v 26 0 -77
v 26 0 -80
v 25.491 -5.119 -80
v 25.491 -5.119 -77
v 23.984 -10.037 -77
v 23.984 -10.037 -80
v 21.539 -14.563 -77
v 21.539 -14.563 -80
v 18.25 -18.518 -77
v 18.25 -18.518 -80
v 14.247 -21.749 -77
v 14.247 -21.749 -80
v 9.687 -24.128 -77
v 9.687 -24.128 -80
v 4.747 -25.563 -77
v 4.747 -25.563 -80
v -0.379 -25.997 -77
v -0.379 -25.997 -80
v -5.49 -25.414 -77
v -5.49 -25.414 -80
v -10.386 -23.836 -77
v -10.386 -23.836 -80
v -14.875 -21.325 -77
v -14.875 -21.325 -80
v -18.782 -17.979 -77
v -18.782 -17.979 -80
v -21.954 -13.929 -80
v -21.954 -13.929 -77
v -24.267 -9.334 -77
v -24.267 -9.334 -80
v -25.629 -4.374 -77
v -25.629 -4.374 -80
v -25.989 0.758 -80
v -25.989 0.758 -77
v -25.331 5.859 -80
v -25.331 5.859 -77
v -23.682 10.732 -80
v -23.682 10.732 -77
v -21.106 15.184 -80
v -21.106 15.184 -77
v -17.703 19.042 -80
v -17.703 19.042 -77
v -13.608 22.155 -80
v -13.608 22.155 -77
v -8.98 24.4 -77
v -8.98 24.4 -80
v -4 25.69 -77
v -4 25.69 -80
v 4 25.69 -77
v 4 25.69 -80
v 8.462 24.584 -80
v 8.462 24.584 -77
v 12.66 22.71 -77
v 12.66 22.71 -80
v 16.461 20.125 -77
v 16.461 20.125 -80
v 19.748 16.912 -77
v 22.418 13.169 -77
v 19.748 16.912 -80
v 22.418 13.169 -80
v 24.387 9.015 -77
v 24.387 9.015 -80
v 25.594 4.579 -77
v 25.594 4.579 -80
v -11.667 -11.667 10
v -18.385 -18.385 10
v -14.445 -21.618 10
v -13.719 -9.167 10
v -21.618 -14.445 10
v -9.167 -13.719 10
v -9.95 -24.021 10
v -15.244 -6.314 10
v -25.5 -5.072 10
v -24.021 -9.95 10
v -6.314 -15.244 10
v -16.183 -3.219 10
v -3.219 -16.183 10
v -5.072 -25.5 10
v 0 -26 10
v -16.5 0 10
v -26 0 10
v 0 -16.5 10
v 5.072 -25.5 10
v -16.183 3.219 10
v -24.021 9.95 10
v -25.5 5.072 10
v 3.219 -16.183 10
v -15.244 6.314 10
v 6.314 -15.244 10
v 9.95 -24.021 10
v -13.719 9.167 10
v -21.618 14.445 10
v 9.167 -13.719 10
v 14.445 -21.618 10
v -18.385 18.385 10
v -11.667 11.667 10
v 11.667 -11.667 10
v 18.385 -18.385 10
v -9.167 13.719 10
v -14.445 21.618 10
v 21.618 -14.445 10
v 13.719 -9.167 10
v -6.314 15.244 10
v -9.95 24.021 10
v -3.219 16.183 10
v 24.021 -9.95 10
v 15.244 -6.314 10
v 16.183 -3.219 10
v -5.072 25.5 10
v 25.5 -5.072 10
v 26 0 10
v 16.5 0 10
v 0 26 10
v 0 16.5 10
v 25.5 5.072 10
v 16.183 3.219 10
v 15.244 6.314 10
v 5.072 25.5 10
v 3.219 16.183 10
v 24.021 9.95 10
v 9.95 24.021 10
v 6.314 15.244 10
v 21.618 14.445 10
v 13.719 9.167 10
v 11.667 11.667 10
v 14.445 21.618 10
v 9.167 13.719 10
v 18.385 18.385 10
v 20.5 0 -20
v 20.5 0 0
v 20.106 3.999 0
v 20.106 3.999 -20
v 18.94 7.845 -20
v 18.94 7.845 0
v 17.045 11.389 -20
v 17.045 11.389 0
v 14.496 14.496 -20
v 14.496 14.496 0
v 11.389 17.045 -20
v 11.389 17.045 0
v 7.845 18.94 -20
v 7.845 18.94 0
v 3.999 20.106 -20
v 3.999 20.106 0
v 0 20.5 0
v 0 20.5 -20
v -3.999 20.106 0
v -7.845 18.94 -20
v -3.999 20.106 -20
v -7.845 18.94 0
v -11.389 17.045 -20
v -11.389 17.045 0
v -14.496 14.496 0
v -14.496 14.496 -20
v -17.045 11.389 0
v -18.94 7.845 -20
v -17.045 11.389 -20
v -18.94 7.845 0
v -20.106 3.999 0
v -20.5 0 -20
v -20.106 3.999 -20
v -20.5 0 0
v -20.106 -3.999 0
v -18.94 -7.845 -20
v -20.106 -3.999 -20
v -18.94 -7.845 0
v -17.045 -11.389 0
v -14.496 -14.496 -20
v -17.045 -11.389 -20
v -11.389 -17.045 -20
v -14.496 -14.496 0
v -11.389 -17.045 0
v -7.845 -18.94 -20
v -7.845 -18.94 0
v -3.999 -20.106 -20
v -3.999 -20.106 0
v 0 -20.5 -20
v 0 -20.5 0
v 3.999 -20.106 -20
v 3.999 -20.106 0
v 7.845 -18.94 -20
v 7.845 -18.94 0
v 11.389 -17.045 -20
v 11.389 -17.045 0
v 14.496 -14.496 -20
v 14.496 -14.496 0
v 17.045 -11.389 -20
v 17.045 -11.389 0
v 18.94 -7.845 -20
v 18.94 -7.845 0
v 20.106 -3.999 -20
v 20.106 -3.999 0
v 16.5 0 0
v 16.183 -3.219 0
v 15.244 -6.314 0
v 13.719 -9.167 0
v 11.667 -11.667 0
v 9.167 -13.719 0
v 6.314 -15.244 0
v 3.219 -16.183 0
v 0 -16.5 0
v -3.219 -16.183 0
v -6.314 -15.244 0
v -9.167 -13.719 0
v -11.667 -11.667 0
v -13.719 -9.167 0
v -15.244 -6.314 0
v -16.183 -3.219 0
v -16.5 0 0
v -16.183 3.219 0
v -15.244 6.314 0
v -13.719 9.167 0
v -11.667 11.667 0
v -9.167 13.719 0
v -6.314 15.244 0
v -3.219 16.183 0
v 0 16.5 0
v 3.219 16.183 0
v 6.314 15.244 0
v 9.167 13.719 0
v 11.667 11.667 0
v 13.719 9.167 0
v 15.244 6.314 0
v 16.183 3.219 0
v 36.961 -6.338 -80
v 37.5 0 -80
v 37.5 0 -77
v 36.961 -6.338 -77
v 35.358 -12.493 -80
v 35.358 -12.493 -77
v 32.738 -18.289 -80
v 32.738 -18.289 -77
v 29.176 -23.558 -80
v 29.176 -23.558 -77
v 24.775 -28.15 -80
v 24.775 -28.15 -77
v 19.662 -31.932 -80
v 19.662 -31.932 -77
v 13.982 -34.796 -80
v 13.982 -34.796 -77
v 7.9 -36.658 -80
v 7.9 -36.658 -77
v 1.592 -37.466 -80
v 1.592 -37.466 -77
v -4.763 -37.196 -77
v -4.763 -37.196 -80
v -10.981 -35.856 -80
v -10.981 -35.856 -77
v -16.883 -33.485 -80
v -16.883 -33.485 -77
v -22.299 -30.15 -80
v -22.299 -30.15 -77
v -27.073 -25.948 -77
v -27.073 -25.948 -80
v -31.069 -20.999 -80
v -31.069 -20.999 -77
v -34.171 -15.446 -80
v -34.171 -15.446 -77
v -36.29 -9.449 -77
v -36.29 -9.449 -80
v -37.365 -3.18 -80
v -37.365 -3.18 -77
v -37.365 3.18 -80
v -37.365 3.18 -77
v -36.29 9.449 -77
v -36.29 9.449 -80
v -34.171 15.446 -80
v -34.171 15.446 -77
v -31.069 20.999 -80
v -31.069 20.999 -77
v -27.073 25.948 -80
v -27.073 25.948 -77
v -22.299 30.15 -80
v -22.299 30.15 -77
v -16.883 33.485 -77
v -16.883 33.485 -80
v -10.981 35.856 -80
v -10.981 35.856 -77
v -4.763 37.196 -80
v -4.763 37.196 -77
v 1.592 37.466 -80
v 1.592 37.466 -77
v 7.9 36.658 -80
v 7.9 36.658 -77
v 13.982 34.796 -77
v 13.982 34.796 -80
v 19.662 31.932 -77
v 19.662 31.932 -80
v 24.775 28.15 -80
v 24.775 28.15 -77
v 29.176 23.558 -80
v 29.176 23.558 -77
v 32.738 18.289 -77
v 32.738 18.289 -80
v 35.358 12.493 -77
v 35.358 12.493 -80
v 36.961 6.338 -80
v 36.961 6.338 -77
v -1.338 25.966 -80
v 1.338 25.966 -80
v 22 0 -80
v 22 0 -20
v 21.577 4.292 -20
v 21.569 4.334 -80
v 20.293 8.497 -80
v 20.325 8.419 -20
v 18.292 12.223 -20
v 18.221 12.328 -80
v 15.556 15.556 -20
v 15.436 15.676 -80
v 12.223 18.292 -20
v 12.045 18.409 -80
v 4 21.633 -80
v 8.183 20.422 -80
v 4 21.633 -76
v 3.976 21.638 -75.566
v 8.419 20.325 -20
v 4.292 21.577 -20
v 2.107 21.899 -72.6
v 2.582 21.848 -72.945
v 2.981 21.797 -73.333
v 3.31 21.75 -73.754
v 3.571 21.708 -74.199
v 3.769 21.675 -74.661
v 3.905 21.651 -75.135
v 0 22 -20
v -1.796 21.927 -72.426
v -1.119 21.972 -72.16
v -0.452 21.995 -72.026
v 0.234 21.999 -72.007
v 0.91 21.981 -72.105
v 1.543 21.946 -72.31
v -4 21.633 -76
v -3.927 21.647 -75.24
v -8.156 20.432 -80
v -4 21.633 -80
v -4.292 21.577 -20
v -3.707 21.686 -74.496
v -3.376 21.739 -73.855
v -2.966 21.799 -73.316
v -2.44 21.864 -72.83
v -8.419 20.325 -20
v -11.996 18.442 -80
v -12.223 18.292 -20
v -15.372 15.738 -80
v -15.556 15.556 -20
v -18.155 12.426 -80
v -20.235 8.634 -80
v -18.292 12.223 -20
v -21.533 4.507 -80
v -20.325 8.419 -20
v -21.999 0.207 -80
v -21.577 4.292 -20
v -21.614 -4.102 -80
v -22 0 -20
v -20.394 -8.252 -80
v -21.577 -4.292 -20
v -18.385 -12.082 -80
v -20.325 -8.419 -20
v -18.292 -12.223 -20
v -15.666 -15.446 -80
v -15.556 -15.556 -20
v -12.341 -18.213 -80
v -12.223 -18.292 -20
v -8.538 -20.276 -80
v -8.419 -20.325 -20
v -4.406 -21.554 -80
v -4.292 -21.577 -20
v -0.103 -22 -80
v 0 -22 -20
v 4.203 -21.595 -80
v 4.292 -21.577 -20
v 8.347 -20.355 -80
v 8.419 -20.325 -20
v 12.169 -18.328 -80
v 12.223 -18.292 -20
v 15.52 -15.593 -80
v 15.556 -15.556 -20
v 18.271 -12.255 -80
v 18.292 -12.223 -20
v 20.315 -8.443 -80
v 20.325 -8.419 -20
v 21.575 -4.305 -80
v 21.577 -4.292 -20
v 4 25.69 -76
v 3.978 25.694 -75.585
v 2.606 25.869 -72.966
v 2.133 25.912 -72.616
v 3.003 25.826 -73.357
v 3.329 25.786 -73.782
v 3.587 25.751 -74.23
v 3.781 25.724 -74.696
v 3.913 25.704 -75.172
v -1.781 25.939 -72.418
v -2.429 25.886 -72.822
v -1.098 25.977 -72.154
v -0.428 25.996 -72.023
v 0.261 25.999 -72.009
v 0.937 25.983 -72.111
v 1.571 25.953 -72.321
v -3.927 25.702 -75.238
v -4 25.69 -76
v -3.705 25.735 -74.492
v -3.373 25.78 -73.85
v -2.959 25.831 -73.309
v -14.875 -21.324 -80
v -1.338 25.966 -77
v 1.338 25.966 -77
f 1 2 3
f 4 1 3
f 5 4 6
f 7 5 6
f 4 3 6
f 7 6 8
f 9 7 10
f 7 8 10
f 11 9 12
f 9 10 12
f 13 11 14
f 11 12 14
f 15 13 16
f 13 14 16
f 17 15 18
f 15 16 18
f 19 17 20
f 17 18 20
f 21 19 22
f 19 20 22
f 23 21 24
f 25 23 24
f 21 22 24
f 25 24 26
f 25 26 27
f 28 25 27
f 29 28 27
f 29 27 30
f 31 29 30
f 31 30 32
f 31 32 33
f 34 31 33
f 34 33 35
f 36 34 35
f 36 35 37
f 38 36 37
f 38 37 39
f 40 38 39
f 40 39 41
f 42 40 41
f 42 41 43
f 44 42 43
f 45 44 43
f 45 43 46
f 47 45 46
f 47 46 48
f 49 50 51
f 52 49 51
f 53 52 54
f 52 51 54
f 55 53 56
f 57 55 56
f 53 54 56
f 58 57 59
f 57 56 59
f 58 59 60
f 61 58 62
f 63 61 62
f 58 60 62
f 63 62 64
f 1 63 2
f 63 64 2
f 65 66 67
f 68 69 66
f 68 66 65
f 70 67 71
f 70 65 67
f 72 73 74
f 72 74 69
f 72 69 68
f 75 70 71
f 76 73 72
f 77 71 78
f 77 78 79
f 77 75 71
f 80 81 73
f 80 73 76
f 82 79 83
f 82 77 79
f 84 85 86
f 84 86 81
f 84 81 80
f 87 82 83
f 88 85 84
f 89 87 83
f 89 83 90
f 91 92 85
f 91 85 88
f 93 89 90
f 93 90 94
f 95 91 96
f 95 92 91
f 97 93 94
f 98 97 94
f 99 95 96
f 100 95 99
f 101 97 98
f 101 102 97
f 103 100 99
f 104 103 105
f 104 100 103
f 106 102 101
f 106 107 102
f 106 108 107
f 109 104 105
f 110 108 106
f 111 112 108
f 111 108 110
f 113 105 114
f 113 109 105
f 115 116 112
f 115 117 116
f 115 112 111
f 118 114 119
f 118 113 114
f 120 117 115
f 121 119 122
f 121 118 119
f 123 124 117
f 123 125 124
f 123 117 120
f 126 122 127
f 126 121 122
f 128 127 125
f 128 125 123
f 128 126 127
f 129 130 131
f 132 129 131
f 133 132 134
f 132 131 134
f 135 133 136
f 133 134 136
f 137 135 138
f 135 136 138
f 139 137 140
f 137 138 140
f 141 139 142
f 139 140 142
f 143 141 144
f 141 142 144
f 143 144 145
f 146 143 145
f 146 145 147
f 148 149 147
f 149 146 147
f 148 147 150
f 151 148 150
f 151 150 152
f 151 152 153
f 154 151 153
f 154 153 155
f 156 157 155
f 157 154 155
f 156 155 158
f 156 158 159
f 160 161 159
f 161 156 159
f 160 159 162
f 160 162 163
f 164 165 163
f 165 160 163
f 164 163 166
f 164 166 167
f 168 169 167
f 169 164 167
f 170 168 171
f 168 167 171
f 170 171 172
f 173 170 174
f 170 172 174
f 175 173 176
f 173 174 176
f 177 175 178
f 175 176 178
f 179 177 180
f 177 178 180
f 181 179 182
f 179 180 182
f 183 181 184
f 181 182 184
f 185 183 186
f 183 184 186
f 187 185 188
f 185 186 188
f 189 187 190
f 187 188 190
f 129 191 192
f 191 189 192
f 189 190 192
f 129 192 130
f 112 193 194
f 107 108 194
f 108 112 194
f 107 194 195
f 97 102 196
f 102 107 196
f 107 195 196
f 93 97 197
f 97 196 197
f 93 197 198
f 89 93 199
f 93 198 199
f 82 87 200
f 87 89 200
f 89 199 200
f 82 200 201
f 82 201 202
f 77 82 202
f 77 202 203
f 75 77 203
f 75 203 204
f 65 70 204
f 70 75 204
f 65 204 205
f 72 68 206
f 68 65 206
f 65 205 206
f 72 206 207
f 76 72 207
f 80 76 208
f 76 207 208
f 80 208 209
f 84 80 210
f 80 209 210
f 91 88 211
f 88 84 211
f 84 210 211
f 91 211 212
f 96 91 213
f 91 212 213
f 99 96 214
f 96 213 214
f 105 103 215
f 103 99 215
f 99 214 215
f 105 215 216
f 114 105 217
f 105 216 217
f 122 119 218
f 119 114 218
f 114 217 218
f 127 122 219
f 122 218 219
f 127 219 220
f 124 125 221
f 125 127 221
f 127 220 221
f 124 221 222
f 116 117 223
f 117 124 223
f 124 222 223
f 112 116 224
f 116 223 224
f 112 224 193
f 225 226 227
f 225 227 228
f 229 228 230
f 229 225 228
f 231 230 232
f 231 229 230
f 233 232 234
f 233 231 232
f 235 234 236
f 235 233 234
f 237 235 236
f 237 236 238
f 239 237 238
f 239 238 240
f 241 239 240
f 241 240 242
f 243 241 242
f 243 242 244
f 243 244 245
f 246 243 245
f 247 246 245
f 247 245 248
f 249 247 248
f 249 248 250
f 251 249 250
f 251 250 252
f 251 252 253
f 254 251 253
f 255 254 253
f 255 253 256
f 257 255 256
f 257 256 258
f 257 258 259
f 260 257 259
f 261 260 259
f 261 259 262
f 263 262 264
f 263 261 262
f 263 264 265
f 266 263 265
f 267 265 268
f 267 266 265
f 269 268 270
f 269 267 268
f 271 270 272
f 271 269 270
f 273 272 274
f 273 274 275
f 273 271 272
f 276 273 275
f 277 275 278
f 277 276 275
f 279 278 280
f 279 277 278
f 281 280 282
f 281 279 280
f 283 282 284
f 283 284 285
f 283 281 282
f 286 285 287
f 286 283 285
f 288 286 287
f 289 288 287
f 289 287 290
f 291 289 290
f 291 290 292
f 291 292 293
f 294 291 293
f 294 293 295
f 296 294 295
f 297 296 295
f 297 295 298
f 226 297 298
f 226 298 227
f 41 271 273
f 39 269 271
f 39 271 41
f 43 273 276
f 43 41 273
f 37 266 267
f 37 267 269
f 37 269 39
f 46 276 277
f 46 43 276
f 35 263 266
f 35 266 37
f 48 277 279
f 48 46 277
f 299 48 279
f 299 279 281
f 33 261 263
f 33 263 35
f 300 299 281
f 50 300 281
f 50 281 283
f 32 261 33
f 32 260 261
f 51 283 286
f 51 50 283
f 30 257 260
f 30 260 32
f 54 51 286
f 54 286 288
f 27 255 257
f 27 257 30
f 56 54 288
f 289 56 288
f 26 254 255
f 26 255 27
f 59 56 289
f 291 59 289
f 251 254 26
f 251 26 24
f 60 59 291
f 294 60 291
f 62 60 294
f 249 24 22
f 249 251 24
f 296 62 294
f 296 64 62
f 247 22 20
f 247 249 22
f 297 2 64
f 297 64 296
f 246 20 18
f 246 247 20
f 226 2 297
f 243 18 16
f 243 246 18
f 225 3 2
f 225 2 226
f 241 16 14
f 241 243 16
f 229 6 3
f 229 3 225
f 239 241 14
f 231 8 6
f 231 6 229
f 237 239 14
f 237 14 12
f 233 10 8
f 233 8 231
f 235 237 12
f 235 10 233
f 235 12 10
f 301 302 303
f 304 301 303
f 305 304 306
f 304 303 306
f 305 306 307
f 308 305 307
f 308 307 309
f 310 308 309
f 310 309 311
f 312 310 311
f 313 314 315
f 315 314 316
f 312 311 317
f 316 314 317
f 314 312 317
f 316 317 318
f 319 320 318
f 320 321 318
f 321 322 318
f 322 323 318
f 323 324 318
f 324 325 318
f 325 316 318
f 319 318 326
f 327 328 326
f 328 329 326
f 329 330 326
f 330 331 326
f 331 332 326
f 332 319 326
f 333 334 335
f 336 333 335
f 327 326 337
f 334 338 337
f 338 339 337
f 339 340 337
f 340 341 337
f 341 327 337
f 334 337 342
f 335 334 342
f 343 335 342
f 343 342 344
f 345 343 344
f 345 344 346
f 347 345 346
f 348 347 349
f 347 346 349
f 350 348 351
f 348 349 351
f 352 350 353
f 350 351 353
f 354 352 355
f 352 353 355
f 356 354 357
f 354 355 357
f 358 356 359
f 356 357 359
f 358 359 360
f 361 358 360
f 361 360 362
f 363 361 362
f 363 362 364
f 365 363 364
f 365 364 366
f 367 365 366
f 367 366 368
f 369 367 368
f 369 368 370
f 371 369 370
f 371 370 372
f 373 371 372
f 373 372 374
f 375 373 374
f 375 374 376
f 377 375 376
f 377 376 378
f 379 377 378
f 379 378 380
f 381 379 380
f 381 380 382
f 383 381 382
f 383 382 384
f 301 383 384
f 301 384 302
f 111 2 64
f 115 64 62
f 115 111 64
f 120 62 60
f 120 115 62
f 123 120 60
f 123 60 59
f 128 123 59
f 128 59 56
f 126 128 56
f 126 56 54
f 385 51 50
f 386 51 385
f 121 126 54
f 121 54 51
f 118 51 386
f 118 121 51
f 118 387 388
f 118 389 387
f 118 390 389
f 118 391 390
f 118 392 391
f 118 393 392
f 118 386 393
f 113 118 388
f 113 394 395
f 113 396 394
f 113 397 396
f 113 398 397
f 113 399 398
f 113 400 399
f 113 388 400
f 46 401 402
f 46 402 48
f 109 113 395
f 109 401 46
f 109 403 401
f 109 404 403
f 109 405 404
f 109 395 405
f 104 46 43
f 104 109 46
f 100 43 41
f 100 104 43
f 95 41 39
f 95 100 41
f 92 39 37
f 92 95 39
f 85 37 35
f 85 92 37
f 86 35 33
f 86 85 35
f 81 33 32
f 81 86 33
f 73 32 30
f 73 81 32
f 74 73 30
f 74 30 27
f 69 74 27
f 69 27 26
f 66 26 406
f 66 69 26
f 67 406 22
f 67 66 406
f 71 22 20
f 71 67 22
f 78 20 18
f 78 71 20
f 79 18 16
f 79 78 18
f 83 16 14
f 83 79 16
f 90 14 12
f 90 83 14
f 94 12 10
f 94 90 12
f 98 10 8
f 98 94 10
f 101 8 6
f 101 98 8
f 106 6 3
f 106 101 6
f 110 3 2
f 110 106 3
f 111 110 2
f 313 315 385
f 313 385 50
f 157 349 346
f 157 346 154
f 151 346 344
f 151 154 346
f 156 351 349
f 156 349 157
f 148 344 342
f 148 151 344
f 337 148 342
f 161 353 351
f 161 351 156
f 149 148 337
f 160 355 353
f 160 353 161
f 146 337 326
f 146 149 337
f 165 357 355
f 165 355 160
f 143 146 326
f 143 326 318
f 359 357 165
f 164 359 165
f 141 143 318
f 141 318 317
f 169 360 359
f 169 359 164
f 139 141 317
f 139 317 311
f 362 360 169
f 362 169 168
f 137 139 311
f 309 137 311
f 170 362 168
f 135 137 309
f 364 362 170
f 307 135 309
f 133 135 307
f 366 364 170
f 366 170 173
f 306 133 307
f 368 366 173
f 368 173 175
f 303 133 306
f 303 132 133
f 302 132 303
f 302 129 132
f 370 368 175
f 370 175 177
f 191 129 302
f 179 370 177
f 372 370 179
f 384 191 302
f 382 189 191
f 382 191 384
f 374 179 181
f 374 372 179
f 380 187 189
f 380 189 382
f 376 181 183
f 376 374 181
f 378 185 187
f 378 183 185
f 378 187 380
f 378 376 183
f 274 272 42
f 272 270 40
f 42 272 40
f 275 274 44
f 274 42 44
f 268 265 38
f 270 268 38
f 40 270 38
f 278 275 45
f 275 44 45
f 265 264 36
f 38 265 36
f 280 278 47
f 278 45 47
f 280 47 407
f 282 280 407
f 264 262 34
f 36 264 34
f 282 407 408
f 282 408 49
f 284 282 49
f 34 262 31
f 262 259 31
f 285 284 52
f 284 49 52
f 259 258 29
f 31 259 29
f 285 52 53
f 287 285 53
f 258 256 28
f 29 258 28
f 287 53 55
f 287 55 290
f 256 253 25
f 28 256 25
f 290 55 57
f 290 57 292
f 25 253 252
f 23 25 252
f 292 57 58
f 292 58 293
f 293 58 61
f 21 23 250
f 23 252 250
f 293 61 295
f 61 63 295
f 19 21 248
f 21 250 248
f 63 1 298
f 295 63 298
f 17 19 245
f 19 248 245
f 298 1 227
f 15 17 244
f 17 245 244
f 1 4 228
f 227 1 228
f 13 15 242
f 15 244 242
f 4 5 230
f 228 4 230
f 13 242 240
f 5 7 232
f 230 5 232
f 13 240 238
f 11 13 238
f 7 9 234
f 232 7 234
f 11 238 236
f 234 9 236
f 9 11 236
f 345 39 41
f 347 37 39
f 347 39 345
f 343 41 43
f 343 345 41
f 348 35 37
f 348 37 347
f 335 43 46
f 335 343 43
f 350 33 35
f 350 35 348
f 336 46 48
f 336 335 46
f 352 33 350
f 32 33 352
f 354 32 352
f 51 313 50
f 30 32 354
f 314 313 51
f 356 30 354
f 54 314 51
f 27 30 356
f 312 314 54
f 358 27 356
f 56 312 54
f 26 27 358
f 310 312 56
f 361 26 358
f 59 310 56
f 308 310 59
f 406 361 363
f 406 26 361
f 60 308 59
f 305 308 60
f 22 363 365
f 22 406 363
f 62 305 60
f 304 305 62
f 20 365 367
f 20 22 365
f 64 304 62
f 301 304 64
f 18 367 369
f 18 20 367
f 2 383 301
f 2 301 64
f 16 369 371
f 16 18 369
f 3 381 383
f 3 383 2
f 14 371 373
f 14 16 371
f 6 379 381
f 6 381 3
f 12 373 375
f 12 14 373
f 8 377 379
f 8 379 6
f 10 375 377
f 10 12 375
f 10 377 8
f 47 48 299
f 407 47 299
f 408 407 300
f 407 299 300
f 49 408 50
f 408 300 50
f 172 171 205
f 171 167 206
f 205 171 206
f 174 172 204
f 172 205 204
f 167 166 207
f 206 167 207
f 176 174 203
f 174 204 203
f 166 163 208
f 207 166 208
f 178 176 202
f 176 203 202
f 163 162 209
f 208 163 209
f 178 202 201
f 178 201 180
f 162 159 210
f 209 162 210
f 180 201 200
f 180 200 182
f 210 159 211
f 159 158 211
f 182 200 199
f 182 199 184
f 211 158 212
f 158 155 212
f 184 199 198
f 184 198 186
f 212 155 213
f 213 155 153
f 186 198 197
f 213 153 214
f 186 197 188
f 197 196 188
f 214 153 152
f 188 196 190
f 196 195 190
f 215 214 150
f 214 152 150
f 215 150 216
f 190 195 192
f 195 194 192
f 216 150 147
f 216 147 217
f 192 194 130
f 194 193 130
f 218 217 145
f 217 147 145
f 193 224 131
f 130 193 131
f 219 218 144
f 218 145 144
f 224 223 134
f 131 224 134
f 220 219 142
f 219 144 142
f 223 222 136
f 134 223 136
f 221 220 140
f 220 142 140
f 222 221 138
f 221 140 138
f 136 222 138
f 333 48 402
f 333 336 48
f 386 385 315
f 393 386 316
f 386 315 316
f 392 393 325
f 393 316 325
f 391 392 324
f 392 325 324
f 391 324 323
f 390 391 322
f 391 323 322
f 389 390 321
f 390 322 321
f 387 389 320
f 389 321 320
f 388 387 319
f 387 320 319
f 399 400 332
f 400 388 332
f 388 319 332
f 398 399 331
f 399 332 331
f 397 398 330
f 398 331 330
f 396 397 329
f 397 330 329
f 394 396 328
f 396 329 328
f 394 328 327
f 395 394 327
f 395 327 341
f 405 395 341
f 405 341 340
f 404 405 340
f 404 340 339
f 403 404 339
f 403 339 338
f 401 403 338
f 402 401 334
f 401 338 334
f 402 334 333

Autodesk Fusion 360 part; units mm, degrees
sketch "Sketch1" plane through (0, 0, 0) normal (0, 0, 1) x (1, 0, 0)
  circle A0 centre (0, 0) radius 26
  circle A1 centre (0, 0) radius 16.5
  dimension "d1" = 52
  dimension "d2" = 33
extrude "Extrude1" add sketch "Sketch1" along normal blind 10 makes body 1
sketch "Sketch2" plane through (0, 0, 0) normal (0, 0, -1) x (1, 0, 0)
  circle A0 centre (0, 0) radius 16.5
  circle A1 centre (0, 0) radius 26
  circle A2 centre (0, 0) radius 20.5
  circle A3 centre (0, 0) radius 26
  dimension "d5" = 41
extrude "Extrude2" add sketch "Sketch2" along normal blind 20 contours A1 A3 bodies 1
sketch "Sketch3" plane through (0, 0, -20) normal (0, 0, -1) x (1, 0, 0)
  circle A0 centre (0, 0) radius 20.5
  circle A1 centre (0, 0) radius 26
  circle A2 centre (0, 0) radius 26
  circle A3 centre (0, 0) radius 22
  dimension "d8" = 44
extrude "Extrude3" add sketch "Sketch3" along normal blind 60 contours A1 A2 bodies 1
sketch "Sketch4" plane through (0, 0, 0) normal (0, 1, 0) x (1, 0, 0)
  circle A0 centre (0, 76) radius 4
  line L0 (0, 87) -> (0, 61.5698)
  line L1 (-16, 80) -> (14, 80)
  line L2 (-4, 76) -> (4, 76)
  line L3 (4, 76) -> (4, 83.4251)
  line L4 (4, 83.4251) -> (-4, 83.4251)
  line L5 (-4, 83.4251) -> (-4, 76)
  point P0 (0, 80)
  dimension "d11" = 8
  dimension "d12" = 8
extrude "Extrude4" cut sketch "Sketch4" along normal blind 70 bodies 1
sketch "Sketch5" plane through (0, 0, -80) normal (0, 0, -1) x (1, 0, 0)
  line L0 (-4, -25.6905) -> (-4, -21.6333)
  arc A0 (4, -21.6333) -> (-4, -21.6333) centre (0, 0) ccw
  line L1 (4, -21.6333) -> (4, -25.6905)
  arc A1 (4, -25.6905) -> (-4, -25.6905) centre (0, 0) ccw
  circle A2 centre (0, 0) radius 37.5
  circle A3 centre (0, 0) radius 26
  dimension "d15" = 75
extrude "Extrude5" add sketch "Sketch5" against normal blind 3 separate body makes body 2
